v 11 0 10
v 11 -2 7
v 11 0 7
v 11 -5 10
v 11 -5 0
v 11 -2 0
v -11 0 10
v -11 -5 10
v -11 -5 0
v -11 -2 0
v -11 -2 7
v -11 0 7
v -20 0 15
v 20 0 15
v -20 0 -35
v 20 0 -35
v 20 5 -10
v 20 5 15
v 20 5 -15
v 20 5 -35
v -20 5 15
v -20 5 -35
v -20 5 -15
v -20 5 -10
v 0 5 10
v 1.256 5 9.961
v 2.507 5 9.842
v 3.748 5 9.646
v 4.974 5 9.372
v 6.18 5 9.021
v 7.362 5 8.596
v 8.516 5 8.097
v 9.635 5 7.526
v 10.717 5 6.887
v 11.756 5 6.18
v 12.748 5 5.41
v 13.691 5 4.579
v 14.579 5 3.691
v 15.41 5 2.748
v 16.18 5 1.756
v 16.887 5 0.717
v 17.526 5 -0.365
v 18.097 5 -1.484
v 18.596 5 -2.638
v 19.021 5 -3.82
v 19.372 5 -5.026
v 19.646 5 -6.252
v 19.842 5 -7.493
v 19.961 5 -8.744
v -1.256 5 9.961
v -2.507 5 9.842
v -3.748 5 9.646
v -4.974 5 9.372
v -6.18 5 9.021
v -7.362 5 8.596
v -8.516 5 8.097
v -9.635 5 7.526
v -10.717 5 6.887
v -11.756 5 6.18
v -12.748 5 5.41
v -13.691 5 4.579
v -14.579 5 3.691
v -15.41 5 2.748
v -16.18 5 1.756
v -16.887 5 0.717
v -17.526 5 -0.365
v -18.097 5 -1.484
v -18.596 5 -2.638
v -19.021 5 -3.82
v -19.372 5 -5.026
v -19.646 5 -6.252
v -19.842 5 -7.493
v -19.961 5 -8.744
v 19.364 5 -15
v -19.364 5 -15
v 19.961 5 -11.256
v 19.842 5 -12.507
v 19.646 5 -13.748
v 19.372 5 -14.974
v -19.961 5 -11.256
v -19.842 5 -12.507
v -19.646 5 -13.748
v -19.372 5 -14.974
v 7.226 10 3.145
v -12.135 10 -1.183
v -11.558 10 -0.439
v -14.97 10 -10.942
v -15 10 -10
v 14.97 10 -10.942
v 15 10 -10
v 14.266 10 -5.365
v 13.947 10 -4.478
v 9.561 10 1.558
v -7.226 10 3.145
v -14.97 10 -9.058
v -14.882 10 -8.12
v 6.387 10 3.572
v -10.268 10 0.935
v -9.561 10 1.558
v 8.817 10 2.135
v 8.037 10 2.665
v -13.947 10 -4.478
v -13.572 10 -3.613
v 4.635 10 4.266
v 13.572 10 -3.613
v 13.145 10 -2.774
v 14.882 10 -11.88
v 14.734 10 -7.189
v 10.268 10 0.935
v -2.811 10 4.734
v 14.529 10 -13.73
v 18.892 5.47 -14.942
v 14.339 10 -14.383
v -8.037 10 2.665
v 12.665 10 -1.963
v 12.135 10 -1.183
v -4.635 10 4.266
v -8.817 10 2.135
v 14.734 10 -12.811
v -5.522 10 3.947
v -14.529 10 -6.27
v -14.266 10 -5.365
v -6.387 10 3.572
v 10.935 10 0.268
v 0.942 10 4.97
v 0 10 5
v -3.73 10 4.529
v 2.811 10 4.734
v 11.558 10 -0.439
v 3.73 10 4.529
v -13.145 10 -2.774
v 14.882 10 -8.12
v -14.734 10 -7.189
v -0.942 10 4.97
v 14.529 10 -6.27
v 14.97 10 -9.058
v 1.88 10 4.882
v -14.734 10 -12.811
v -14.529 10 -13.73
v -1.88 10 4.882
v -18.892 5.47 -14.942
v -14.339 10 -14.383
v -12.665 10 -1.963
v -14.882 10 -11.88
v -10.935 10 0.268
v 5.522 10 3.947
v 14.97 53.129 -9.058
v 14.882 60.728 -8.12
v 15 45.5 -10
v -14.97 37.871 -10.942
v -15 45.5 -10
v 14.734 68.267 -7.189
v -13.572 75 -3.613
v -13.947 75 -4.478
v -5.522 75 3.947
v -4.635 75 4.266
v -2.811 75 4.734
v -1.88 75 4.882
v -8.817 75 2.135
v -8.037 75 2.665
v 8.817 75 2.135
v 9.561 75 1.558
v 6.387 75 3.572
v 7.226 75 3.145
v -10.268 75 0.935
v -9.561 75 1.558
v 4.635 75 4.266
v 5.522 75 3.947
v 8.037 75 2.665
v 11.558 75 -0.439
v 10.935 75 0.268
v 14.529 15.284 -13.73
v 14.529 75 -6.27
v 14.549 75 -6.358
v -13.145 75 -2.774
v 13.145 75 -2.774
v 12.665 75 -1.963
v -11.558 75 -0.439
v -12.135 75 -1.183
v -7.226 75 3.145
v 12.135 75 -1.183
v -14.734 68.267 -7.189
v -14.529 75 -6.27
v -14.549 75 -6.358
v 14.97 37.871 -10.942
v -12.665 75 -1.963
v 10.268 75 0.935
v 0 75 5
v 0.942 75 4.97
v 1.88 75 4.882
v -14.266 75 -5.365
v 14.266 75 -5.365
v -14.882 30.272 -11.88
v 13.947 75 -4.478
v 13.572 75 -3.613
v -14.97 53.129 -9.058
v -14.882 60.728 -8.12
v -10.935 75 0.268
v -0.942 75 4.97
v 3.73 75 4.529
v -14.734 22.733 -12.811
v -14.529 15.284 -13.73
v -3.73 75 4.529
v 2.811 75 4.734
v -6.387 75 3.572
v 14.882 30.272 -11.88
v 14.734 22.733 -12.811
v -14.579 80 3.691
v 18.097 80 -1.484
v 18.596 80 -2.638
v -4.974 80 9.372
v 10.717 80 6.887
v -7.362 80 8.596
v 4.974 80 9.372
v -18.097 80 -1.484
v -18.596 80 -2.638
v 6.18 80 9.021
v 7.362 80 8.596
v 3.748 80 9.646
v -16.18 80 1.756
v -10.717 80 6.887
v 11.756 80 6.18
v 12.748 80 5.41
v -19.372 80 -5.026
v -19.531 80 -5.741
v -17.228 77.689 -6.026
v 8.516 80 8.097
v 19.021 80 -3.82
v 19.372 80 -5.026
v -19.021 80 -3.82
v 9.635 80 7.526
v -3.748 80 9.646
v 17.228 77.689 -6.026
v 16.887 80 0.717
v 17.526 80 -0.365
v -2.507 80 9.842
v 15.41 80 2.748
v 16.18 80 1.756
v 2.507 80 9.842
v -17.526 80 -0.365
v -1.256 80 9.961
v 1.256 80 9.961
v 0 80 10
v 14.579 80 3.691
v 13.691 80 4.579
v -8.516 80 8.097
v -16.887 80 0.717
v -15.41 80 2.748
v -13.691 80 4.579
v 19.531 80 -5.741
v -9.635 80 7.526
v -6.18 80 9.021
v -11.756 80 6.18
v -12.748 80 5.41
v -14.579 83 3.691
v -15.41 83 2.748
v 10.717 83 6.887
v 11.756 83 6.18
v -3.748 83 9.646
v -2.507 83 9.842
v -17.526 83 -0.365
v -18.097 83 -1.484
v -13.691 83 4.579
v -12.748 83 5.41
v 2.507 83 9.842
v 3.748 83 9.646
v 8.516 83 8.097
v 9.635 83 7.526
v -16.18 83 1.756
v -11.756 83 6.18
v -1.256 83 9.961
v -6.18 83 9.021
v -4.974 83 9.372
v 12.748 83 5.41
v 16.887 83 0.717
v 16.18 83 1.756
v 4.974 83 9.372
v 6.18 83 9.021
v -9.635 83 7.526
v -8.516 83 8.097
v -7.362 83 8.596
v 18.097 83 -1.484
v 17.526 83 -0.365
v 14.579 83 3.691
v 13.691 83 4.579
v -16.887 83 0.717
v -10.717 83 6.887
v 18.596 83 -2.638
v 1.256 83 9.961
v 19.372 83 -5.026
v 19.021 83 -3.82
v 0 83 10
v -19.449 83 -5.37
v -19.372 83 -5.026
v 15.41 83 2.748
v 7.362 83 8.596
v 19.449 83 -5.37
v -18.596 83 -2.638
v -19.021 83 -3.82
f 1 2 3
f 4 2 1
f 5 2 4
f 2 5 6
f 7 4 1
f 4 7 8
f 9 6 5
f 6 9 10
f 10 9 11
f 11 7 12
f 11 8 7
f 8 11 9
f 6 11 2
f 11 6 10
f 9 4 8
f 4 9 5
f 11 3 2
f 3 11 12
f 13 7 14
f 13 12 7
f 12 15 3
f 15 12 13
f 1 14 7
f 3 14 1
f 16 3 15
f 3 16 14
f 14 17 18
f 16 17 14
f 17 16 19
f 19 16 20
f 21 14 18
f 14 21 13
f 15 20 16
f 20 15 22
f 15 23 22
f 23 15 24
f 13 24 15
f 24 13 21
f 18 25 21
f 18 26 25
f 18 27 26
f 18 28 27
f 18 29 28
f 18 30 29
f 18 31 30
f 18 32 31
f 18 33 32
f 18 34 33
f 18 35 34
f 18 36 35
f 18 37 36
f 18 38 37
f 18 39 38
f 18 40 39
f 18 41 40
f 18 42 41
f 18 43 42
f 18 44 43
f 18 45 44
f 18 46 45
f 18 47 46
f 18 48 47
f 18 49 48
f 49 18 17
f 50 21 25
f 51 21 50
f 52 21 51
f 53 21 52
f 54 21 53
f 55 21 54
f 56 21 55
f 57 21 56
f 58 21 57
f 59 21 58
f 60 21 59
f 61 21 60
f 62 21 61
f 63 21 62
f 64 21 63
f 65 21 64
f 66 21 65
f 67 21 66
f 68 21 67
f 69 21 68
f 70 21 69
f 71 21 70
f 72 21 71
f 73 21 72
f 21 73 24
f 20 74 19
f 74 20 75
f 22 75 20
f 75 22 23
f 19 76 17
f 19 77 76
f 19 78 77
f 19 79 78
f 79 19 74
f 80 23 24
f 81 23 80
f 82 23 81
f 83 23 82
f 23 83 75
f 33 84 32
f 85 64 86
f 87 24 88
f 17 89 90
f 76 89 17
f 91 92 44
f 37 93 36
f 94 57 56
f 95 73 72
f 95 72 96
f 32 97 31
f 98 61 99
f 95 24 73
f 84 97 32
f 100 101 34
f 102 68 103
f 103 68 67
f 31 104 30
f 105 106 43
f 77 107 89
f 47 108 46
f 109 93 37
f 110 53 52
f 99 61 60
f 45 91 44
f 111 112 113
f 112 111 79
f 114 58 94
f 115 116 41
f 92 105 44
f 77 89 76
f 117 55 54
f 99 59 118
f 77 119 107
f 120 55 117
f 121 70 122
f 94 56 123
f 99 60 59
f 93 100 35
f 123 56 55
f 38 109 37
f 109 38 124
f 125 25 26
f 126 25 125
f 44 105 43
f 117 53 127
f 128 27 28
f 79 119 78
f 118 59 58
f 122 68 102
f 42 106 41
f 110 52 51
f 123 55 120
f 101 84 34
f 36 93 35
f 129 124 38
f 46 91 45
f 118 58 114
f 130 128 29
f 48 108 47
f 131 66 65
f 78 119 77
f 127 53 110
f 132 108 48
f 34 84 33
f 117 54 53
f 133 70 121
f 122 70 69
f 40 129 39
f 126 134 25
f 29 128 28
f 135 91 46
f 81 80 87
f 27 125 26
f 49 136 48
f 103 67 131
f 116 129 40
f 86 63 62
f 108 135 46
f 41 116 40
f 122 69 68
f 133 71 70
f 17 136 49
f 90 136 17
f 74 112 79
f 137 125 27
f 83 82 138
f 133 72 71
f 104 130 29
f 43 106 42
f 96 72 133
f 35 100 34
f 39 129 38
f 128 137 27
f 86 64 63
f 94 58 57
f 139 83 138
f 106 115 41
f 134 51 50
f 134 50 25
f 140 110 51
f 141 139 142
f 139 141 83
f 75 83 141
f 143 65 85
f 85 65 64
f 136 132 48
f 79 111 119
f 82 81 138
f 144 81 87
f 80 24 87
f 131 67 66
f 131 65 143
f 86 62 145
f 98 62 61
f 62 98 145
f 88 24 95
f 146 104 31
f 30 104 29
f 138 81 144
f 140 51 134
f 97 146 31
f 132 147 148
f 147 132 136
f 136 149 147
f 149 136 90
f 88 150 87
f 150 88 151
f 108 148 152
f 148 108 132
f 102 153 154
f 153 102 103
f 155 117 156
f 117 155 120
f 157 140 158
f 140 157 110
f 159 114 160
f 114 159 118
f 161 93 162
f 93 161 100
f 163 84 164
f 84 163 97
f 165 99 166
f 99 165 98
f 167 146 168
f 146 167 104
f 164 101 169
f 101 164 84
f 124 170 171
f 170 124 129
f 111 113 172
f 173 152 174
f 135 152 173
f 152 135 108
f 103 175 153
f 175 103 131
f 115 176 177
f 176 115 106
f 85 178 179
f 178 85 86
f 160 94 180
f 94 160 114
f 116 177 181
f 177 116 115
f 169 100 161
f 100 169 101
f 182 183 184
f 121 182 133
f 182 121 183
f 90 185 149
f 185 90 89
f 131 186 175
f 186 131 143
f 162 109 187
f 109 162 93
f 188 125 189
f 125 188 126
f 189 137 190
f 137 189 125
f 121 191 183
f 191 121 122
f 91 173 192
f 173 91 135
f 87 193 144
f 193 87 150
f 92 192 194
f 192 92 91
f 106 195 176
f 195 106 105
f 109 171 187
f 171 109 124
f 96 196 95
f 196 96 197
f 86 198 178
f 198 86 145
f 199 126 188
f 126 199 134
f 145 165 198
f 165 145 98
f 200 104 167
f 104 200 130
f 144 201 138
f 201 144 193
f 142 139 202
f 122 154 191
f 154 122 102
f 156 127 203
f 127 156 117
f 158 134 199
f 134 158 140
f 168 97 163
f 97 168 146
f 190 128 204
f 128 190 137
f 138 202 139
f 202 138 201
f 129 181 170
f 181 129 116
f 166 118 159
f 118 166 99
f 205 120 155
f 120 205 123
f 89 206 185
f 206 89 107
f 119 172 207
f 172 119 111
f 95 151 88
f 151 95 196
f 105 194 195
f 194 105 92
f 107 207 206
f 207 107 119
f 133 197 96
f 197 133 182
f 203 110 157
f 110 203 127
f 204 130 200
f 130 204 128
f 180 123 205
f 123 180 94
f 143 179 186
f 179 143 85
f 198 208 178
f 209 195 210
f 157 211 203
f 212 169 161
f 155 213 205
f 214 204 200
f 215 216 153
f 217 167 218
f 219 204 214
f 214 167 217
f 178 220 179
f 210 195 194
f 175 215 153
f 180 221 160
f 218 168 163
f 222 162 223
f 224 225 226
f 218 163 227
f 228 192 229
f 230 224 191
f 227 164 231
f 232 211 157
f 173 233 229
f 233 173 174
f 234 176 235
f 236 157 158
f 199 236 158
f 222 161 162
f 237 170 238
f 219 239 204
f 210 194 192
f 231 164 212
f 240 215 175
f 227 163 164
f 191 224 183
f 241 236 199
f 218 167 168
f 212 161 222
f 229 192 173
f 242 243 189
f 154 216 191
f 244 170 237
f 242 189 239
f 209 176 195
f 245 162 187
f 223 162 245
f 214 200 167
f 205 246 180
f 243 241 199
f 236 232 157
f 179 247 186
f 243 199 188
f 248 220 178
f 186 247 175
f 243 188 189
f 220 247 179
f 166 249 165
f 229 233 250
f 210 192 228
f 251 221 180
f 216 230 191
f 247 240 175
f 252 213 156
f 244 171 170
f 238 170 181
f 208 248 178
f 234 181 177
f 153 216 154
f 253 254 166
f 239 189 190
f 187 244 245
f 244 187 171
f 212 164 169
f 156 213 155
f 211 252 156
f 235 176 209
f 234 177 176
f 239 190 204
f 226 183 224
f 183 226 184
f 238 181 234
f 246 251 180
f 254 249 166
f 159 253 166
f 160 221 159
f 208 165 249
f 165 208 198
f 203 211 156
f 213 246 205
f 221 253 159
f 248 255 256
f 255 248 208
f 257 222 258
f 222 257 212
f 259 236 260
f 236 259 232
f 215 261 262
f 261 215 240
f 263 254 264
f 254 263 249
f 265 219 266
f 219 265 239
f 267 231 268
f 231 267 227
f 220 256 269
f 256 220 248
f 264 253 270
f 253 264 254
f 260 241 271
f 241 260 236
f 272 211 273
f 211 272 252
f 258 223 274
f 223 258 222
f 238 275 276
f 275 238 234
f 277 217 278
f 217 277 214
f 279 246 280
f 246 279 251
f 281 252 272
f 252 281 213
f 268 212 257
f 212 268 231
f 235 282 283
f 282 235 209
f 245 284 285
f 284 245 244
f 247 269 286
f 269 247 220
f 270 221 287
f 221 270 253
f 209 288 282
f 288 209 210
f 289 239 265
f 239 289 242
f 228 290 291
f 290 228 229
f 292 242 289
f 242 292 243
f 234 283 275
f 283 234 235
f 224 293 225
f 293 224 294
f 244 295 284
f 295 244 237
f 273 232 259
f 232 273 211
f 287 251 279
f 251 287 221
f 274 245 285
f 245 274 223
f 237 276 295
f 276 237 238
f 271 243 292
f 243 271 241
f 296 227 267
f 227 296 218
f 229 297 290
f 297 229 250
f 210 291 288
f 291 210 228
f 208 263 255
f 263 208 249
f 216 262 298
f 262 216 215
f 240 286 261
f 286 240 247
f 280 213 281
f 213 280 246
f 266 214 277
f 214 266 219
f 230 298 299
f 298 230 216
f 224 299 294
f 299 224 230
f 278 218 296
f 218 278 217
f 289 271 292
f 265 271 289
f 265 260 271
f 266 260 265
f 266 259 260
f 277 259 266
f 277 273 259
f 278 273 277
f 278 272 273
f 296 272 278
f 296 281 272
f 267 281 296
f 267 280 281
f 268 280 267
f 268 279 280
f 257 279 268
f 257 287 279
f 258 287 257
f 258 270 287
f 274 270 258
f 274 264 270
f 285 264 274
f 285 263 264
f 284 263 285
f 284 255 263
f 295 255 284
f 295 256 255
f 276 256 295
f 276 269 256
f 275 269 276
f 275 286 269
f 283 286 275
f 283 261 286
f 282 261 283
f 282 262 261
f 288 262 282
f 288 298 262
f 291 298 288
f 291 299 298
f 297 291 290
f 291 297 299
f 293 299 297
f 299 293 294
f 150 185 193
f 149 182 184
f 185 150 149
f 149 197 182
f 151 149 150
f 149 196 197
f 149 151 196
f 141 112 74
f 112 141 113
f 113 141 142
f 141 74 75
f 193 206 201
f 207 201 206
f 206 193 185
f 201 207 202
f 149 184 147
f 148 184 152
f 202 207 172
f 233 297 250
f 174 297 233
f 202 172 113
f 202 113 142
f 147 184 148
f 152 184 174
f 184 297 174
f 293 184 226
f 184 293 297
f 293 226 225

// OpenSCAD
// UP-grade is a customisable roll holder for the UP mini 3D printer
// so this small printer can carry big filament rolls
// https://www.up3d.com/?r=mini

// Written for OpenScad by Bruno Herfst 2016
// http://www.openscad.org

// NOTE: If I added a 0 to a variable it is it doesn't show in the custumizer

// Roll Spec
rollWidth = 70;

// Holder spec
holderDepth        = 10;
holderLever        = 0;
bevelWidth         = 5;
lipTickness        = 3;
holderDiameter     = 30;
backWallThickness  = 5+0;
frontWallThickness = 3+0;

// Printer Spec
pHoleWidth = 22+0; // 24 Actual
pHoleHeiht = 10+0; // 12 Actual
pWall      = 2 +0;  //  1 Actual

// Short cuts
hDepth   = holderDepth/2;
rWidth   = rollWidth + bevelWidth;
// Material Saver
ms_Height = ((holderDiameter+holderDepth)/100)*25;
ms_Offset = ((holderDiameter+holderDepth)/100)*25;
// Backwall
bwWidth  = holderDiameter + holderDepth;
bwHeight = holderDiameter + (holderDepth*2) + holderLever;

$fn = 100;

module prism(l, w, h){
    polyhedron(
        points=[[0,0,0], [l,0,0], [l,w,0], [0,w,0], [0,w,h], [l,w,h]],
        faces=[[0,1,2,3],[5,4,3,2],[0,4,5,1],[0,3,4],[5,2,1]]
    );
}

difference() {
// Create holder
union() { 
    // Create lip
    translate([-(pHoleWidth/2),-(pWall+lipTickness),0]) {
        cube([pHoleWidth,lipTickness,pHoleHeiht]);
        translate([0,0,pHoleHeiht-lipTickness]) {
            cube([pHoleWidth,lipTickness+pWall,lipTickness]);
        }
    }

    // Create backWall
    translate([-bwWidth/2,0,-(bwHeight-pHoleHeiht)+hDepth]){
        cube([bwWidth,backWallThickness,bwHeight]);
    }
    
    // Bevel
    translate([0,backWallThickness+(bevelWidth/2),pHoleHeiht-hDepth-(holderDiameter/2)]){
        rotate([-90,0,0])
        cylinder(  bevelWidth, d1=holderDiameter+holderDepth, d2=holderDiameter, center=true);
    }
    
    // Create holder
    translate([0,rWidth/2+backWallThickness,pHoleHeiht-hDepth-(holderDiameter/2)]){
        rotate([90,0,0])
        cylinder(  rWidth, d=holderDiameter, center=true);
    }

    // Create holder finish
    // Bevel
    translate([0,rWidth+backWallThickness-(bevelWidth/2),pHoleHeiht-hDepth-(holderDiameter/2)]){
        rotate([90,0,0])
        cylinder(  bevelWidth, d1=holderDiameter+holderDepth, d2=holderDiameter, center=true);
    }
    translate([0,rWidth+backWallThickness+frontWallThickness-(frontWallThickness/2),pHoleHeiht-hDepth-(holderDiameter/2)]){
        rotate([90,0,0])
        cylinder(  frontWallThickness, d=holderDiameter+holderDepth, center=true);
    }
}
// Create material saver
union() {
    translate([-bwWidth/2,backWallThickness,pHoleHeiht-hDepth-holderDiameter+ms_Offset]){
        prism(bwWidth, rWidth+frontWallThickness+3, ms_Height);
    }
    translate([-bwWidth/2,backWallThickness,pHoleHeiht-hDepth-holderDiameter-bwHeight+ms_Offset]){
        cube([bwWidth, rWidth+frontWallThickness+3, bwHeight]);
    }
}
}
